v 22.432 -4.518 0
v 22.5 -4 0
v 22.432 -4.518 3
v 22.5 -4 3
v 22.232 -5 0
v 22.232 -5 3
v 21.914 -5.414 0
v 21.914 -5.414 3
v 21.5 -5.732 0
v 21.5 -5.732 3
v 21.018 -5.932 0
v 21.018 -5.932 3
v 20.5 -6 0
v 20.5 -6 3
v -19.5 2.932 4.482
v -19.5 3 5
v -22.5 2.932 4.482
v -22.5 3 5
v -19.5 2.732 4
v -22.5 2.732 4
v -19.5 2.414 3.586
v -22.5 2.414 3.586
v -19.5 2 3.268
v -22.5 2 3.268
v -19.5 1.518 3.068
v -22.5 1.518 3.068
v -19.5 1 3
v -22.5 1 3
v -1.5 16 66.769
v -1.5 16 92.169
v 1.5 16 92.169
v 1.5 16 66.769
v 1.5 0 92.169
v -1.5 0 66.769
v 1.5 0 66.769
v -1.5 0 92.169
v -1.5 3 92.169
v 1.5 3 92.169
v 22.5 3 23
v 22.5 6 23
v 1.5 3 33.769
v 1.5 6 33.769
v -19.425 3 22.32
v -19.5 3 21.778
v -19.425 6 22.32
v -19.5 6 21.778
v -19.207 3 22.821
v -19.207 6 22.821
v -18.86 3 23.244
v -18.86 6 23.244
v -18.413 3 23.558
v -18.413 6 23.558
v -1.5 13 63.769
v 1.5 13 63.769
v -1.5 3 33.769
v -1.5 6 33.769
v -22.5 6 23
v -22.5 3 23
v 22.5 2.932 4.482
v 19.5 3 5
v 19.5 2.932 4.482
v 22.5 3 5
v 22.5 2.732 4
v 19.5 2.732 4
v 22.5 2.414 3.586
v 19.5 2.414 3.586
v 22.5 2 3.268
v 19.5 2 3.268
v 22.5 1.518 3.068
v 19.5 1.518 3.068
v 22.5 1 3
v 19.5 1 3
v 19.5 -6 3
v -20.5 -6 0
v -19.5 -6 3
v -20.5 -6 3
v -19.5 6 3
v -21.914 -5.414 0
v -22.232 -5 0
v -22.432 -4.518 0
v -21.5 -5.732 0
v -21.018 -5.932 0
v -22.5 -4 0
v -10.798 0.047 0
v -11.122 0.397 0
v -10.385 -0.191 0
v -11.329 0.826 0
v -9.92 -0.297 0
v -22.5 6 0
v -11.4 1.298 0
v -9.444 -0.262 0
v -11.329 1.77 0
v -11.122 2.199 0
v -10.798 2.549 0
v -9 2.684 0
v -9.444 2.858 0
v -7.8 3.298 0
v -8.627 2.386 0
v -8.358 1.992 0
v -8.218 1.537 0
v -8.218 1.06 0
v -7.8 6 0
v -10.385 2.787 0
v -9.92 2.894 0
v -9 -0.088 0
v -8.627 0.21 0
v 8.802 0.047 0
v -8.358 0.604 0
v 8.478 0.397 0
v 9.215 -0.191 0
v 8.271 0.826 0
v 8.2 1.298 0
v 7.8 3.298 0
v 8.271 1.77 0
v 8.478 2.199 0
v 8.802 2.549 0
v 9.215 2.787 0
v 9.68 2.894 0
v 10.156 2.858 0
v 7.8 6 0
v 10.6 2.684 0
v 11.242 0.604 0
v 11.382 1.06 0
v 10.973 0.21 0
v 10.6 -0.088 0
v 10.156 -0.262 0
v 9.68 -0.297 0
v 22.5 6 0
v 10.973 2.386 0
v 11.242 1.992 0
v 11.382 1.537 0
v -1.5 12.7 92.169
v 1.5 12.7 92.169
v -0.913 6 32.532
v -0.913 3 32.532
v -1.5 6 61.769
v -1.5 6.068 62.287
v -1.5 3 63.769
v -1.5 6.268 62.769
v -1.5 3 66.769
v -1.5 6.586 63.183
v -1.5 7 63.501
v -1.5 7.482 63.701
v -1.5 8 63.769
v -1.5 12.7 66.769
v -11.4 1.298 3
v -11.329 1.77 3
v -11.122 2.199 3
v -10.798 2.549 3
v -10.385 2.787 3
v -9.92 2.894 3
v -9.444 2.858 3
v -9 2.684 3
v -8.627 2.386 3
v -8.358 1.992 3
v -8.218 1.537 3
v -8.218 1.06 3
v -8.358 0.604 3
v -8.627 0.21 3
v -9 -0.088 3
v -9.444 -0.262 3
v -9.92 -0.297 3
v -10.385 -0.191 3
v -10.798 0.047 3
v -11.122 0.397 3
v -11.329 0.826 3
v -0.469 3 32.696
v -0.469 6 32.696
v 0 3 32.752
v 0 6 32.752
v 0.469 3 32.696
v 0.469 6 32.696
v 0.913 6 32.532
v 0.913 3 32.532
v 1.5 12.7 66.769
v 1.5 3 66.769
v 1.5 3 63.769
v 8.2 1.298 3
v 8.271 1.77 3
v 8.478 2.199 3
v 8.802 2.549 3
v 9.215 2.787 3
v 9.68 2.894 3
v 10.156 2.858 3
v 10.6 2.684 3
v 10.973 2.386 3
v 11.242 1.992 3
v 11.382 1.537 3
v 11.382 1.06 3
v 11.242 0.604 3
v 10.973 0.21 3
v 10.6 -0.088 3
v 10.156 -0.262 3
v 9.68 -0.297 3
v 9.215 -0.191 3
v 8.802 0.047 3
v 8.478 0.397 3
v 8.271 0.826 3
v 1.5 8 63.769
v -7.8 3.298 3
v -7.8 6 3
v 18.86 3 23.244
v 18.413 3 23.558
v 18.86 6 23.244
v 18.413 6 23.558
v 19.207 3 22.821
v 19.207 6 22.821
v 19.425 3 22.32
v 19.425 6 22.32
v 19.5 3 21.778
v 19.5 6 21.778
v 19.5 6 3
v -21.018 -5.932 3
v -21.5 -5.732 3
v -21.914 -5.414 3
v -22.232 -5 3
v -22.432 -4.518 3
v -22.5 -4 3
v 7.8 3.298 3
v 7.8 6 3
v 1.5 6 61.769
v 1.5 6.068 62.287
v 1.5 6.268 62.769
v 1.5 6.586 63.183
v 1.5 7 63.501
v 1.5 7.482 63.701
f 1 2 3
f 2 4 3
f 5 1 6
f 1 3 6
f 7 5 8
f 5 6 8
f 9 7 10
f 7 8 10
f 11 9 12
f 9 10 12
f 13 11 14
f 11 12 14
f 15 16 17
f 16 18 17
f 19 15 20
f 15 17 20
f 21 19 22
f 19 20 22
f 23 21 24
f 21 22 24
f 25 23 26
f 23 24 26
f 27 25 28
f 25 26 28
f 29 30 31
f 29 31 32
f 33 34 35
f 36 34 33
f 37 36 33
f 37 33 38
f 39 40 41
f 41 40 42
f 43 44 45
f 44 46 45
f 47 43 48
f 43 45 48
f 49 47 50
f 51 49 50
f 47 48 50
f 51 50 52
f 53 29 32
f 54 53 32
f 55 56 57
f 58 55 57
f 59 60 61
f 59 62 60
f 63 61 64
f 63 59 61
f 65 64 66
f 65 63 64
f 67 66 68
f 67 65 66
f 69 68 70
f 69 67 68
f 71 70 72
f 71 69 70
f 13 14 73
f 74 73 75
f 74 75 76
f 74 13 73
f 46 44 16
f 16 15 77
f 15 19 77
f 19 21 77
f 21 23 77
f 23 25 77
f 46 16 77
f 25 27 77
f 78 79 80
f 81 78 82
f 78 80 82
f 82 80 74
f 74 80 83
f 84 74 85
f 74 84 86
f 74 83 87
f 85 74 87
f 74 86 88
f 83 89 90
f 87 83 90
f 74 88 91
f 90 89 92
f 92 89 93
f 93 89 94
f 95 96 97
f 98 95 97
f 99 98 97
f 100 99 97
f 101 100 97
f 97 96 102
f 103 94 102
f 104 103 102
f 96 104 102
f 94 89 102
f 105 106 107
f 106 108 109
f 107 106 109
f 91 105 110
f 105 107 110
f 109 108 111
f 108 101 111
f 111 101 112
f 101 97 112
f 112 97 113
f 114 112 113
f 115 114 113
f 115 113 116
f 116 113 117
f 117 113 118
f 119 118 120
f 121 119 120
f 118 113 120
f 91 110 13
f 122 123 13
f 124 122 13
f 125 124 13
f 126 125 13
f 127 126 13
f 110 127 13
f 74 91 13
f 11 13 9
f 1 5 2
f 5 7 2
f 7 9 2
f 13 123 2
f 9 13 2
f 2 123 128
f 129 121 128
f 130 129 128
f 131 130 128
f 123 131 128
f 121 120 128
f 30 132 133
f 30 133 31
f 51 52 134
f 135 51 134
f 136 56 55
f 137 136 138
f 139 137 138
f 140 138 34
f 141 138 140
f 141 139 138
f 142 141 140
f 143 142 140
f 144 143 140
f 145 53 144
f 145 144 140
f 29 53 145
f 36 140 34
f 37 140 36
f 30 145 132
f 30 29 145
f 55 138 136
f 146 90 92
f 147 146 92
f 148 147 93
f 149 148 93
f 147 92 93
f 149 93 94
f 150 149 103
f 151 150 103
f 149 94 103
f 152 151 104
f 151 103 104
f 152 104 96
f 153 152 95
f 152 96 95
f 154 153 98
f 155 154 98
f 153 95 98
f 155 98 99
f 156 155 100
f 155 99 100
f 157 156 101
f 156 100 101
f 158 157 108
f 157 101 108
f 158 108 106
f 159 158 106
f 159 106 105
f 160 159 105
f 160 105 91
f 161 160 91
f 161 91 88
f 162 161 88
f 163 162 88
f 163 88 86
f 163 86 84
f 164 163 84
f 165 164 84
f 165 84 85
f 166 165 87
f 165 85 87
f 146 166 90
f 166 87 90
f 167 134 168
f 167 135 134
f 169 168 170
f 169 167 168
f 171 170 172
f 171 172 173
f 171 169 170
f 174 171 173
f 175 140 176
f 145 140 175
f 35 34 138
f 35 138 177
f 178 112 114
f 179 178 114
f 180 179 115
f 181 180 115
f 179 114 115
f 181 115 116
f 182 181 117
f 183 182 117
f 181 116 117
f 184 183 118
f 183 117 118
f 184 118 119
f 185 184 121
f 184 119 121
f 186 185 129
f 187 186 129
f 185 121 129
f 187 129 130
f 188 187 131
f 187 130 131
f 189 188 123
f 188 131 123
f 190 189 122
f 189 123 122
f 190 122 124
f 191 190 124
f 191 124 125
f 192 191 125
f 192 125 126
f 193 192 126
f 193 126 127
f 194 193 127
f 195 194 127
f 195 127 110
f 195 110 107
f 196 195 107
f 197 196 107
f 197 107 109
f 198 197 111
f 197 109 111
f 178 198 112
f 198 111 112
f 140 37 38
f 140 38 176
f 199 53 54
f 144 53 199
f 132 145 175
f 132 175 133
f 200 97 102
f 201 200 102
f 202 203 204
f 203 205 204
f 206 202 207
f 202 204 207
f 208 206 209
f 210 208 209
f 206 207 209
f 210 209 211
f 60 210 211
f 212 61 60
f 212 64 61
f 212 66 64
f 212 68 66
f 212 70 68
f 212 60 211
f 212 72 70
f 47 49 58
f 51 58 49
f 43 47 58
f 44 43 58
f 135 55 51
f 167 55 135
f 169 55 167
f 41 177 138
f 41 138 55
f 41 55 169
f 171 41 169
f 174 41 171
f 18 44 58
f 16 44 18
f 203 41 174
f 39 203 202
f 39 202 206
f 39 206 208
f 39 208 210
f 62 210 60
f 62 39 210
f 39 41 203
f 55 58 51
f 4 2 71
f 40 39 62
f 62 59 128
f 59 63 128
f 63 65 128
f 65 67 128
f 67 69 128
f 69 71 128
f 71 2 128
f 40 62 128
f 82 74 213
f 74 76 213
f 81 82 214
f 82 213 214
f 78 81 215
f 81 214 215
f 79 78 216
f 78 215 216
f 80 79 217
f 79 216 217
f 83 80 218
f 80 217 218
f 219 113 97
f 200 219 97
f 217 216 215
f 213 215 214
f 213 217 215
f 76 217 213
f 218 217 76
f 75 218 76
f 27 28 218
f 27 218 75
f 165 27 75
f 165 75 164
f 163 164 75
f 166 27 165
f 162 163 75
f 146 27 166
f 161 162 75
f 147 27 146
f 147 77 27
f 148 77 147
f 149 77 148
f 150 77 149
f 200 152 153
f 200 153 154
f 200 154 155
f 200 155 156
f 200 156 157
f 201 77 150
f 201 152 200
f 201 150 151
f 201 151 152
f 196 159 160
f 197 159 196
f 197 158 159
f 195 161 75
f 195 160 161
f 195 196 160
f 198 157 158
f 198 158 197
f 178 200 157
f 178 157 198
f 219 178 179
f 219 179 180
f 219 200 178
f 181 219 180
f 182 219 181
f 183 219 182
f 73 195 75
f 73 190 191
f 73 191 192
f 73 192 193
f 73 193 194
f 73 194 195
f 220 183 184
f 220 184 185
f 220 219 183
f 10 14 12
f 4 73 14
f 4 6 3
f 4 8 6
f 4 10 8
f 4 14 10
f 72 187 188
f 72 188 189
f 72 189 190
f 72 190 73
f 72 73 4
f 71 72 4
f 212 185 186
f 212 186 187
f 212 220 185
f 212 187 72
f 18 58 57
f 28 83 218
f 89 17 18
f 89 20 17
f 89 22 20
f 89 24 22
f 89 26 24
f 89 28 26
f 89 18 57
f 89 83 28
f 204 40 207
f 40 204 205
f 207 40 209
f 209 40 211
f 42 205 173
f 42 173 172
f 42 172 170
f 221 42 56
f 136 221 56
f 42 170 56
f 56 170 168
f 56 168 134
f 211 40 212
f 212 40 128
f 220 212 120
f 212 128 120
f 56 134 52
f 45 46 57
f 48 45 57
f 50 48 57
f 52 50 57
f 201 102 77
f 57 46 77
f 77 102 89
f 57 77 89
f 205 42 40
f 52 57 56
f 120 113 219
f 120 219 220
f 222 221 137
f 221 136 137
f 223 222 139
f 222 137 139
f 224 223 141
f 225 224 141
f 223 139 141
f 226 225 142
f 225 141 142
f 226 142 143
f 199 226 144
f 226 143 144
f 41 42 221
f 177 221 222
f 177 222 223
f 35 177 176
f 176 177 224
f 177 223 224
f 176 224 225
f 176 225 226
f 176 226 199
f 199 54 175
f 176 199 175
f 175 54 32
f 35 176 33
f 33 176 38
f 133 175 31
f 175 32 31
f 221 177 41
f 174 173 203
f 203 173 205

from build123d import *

# Parameters (mm, degrees)
SKETCH1_W                      = 45
SKETCH1_H                      = 12
BOSS_EXTRUDE1_DEPTH            = 3
SKETCH2_W                      = 3
SKETCH2_H                      = 12
BOSS_EXTRUDE2_DEPTH            = 20
BOSS_EXTRUDE3_DEPTH            = 12
CUT_EXTRUDE3_REACH             = 70.4
SKETCH4_W                      = 32.230769231
SKETCH4_H                      = 9
CUT_EXTRUDE4_REACH             = 70.4
SKETCH5_W                      = 30.769230769
SKETCH5_H                      = 9
CUT_EXTRUDE4_DIRECTION_2_REACH = 70.4
BOSS_EXTRUDE6_DEPTH            = 3
CHAMFER4_SIZE                  = 3
CHAMFER5_SIZE                  = 3
SKETCH9_W                      = 15.6
SKETCH9_H                      = 5.40390508
CUT_EXTRUDE5_DEPTH             = 3
SKETCH10_R                     = 1.6
CUT_EXTRUDE6_DEPTH             = 3
FILLET1_R                      = 2
FILLET2_R                      = 2
FILLET3_R                      = 2


with BuildPart() as part:
    # Sketch1 → Boss-Extrude1 (new body)
    with BuildSketch(Plane.XY):
        Rectangle(SKETCH1_W, SKETCH1_H)
    extrude(amount=BOSS_EXTRUDE1_DEPTH)

    # Sketch2 → Boss-Extrude2 (add)
    with BuildSketch(Plane.XY.offset(3)):
        with Locations((-21, 0)):
            Rectangle(SKETCH2_W, SKETCH2_H)
        with Locations((21, 0)):
            Rectangle(SKETCH2_W, SKETCH2_H)
    extrude(amount=BOSS_EXTRUDE2_DEPTH)

    # Sketch3 → Boss-Extrude3 (add)
    with BuildSketch(Plane(origin=(0, 6, 0), x_dir=(1, 0, 0), z_dir=(0, 1, 0))):
        Polygon((-19.5, -23), (0, -33), (19.5, -23), (22.5, -23), (1.5, -33.769230769), (1.5, -63.769230769), (-1.5, -63.769230769), (-1.5, -33.769230769), (-22.5, -23), align=None)
    extrude(amount=-BOSS_EXTRUDE3_DEPTH)

    # Cut-Extrude3: up to this face of the body (flat: up to its plane)
    cut_extrude3_end = Plane(part.part.faces().sort_by_distance((-1.5, 0, 48.769230769))[0])
    # Sketch4 → Cut-Extrude3 (cut, up to the picked face)
    with BuildSketch(Plane(origin=(1.5, 0, 0), x_dir=(0, 0, -1), z_dir=(1, 0, 0)), mode=Mode.PRIVATE) as cut_extrude3_sk1:
        with Locations((-49.884615385, -1.5)):
            Rectangle(SKETCH4_W, SKETCH4_H)
    cut_extrude3_tool1 = split(extrude(cut_extrude3_sk1.sketch, amount=-CUT_EXTRUDE3_REACH, mode=Mode.PRIVATE), bisect_by=cut_extrude3_end, keep=Keep.BOTH, mode=Mode.PRIVATE)
    add(cut_extrude3_tool1.solids().sort_by(Axis((1.5, -1.5, 49.884615), (-1, 0, 0)))[0], mode=Mode.SUBTRACT)

    # Cut-Extrude4: up to this face of the body (flat: up to its plane)
    cut_extrude4_end = Plane(part.part.faces().sort_by_distance((-22.5, 0, 11.5))[0])
    # Sketch5 → Cut-Extrude4 (cut, up to the picked face)
    with BuildSketch(Plane(origin=(1.5, 0, 0), x_dir=(0, 0, -1), z_dir=(1, 0, 0)), mode=Mode.PRIVATE) as cut_extrude4_sk1:
        with Locations((-18.384615385, -1.5)):
            Rectangle(SKETCH5_W, SKETCH5_H)
    cut_extrude4_tool1 = split(extrude(cut_extrude4_sk1.sketch, amount=-CUT_EXTRUDE4_REACH, mode=Mode.PRIVATE), bisect_by=cut_extrude4_end, keep=Keep.BOTH, mode=Mode.PRIVATE)
    add(cut_extrude4_tool1.solids().sort_by(Axis((1.5, -1.5, 18.384615), (-1, 0, 0)))[0], mode=Mode.SUBTRACT)

    # Cut-Extrude4 direction 2: up to this face of the body (flat: up to its plane)
    cut_extrude4_direction_2_end = Plane(part.part.faces().sort_by_distance((22.5, 0, 11.5))[0])
    # Sketch5 → Cut-Extrude4 direction 2 (cut, up to the picked face)
    with BuildSketch(Plane(origin=(1.5, 0, 0), x_dir=(0, 0, -1), z_dir=(1, 0, 0)), mode=Mode.PRIVATE) as cut_extrude4_direction_2_sk1:
        with Locations((-18.384615385, -1.5)):
            Rectangle(SKETCH5_W, SKETCH5_H)
    cut_extrude4_direction_2_tool1 = split(extrude(cut_extrude4_direction_2_sk1.sketch, amount=CUT_EXTRUDE4_DIRECTION_2_REACH, mode=Mode.PRIVATE), bisect_by=cut_extrude4_direction_2_end, keep=Keep.BOTH, mode=Mode.PRIVATE)
    add(cut_extrude4_direction_2_tool1.solids().sort_by(Axis((1.5, -1.5, 18.384615), (1, 0, 0)))[0], mode=Mode.SUBTRACT)

    # Sketch8 → Boss-Extrude6 (add)
    with BuildSketch(Plane.ZY.offset(1.5)):
        Polygon((63.769230769, 0), (92.169230769, 0), (92.169230769, 3), (66.769230769, 3), (66.769230769, 12.7), (92.169230769, 12.7), (92.169230769, 16), (85.741661946, 16), (63.769230769, 16), (63.769230769, 6), (63.769230769, 3), align=None)
    extrude(amount=-BOSS_EXTRUDE6_DEPTH)

    # Chamfer4
    chamfer4_edges = [part.edges().sort_by_distance(p)[0] for p in [
        (0, 16, 63.769230769),
    ]]
    chamfer(chamfer4_edges, length=CHAMFER4_SIZE)

    # Chamfer5
    chamfer5_edges = [part.edges().sort_by_distance(p)[0] for p in [
        (0, 0, 63.769230769),
    ]]
    chamfer(chamfer5_edges, length=CHAMFER5_SIZE - 0.0001)  # a hair under: the kernel refuses the full size

    # Sketch9 → Cut-Extrude5 (cut)
    with BuildSketch(Plane(origin=(0, 0, 0), x_dir=(-1, 0, 0), z_dir=(0, 0, -1))):
        with Locations((0, 6)):
            Rectangle(SKETCH9_W, SKETCH9_H)
    extrude(amount=-CUT_EXTRUDE5_DEPTH, mode=Mode.SUBTRACT)

    # Sketch10 → Cut-Extrude6 (cut)
    with BuildSketch(Plane(origin=(0, 0, 0), x_dir=(-1, 0, 0), z_dir=(0, 0, -1))):
        with Locations((-9.8, 1.29804746)):
            Circle(SKETCH10_R)
        with Locations((9.8, 1.29804746)):
            Circle(SKETCH10_R)
    extrude(amount=-CUT_EXTRUDE6_DEPTH, mode=Mode.SUBTRACT)

    # Fillet1
    fillet1_edges = [part.edges().sort_by_distance(p)[0] for p in [
        (19.5, 4.5, 23),
        (0, 6, 63.769230769),
        (0, 4.5, 33),
        (-19.5, 4.5, 23),
    ]]
    fillet(fillet1_edges, radius=FILLET1_R)

    # Fillet2
    fillet2_edges = [part.edges().sort_by_distance(p)[0] for p in [
        (21, 3, 3),
        (-21, 3, 3),
    ]]
    fillet(fillet2_edges, radius=FILLET2_R)

    # Fillet3
    fillet3_edges = [part.edges().sort_by_distance(p)[0] for p in [
        (-22.5, -6, 1.5),
        (22.5, -6, 1.5),
    ]]
    fillet(fillet3_edges, radius=FILLET3_R)


solid = part.part
